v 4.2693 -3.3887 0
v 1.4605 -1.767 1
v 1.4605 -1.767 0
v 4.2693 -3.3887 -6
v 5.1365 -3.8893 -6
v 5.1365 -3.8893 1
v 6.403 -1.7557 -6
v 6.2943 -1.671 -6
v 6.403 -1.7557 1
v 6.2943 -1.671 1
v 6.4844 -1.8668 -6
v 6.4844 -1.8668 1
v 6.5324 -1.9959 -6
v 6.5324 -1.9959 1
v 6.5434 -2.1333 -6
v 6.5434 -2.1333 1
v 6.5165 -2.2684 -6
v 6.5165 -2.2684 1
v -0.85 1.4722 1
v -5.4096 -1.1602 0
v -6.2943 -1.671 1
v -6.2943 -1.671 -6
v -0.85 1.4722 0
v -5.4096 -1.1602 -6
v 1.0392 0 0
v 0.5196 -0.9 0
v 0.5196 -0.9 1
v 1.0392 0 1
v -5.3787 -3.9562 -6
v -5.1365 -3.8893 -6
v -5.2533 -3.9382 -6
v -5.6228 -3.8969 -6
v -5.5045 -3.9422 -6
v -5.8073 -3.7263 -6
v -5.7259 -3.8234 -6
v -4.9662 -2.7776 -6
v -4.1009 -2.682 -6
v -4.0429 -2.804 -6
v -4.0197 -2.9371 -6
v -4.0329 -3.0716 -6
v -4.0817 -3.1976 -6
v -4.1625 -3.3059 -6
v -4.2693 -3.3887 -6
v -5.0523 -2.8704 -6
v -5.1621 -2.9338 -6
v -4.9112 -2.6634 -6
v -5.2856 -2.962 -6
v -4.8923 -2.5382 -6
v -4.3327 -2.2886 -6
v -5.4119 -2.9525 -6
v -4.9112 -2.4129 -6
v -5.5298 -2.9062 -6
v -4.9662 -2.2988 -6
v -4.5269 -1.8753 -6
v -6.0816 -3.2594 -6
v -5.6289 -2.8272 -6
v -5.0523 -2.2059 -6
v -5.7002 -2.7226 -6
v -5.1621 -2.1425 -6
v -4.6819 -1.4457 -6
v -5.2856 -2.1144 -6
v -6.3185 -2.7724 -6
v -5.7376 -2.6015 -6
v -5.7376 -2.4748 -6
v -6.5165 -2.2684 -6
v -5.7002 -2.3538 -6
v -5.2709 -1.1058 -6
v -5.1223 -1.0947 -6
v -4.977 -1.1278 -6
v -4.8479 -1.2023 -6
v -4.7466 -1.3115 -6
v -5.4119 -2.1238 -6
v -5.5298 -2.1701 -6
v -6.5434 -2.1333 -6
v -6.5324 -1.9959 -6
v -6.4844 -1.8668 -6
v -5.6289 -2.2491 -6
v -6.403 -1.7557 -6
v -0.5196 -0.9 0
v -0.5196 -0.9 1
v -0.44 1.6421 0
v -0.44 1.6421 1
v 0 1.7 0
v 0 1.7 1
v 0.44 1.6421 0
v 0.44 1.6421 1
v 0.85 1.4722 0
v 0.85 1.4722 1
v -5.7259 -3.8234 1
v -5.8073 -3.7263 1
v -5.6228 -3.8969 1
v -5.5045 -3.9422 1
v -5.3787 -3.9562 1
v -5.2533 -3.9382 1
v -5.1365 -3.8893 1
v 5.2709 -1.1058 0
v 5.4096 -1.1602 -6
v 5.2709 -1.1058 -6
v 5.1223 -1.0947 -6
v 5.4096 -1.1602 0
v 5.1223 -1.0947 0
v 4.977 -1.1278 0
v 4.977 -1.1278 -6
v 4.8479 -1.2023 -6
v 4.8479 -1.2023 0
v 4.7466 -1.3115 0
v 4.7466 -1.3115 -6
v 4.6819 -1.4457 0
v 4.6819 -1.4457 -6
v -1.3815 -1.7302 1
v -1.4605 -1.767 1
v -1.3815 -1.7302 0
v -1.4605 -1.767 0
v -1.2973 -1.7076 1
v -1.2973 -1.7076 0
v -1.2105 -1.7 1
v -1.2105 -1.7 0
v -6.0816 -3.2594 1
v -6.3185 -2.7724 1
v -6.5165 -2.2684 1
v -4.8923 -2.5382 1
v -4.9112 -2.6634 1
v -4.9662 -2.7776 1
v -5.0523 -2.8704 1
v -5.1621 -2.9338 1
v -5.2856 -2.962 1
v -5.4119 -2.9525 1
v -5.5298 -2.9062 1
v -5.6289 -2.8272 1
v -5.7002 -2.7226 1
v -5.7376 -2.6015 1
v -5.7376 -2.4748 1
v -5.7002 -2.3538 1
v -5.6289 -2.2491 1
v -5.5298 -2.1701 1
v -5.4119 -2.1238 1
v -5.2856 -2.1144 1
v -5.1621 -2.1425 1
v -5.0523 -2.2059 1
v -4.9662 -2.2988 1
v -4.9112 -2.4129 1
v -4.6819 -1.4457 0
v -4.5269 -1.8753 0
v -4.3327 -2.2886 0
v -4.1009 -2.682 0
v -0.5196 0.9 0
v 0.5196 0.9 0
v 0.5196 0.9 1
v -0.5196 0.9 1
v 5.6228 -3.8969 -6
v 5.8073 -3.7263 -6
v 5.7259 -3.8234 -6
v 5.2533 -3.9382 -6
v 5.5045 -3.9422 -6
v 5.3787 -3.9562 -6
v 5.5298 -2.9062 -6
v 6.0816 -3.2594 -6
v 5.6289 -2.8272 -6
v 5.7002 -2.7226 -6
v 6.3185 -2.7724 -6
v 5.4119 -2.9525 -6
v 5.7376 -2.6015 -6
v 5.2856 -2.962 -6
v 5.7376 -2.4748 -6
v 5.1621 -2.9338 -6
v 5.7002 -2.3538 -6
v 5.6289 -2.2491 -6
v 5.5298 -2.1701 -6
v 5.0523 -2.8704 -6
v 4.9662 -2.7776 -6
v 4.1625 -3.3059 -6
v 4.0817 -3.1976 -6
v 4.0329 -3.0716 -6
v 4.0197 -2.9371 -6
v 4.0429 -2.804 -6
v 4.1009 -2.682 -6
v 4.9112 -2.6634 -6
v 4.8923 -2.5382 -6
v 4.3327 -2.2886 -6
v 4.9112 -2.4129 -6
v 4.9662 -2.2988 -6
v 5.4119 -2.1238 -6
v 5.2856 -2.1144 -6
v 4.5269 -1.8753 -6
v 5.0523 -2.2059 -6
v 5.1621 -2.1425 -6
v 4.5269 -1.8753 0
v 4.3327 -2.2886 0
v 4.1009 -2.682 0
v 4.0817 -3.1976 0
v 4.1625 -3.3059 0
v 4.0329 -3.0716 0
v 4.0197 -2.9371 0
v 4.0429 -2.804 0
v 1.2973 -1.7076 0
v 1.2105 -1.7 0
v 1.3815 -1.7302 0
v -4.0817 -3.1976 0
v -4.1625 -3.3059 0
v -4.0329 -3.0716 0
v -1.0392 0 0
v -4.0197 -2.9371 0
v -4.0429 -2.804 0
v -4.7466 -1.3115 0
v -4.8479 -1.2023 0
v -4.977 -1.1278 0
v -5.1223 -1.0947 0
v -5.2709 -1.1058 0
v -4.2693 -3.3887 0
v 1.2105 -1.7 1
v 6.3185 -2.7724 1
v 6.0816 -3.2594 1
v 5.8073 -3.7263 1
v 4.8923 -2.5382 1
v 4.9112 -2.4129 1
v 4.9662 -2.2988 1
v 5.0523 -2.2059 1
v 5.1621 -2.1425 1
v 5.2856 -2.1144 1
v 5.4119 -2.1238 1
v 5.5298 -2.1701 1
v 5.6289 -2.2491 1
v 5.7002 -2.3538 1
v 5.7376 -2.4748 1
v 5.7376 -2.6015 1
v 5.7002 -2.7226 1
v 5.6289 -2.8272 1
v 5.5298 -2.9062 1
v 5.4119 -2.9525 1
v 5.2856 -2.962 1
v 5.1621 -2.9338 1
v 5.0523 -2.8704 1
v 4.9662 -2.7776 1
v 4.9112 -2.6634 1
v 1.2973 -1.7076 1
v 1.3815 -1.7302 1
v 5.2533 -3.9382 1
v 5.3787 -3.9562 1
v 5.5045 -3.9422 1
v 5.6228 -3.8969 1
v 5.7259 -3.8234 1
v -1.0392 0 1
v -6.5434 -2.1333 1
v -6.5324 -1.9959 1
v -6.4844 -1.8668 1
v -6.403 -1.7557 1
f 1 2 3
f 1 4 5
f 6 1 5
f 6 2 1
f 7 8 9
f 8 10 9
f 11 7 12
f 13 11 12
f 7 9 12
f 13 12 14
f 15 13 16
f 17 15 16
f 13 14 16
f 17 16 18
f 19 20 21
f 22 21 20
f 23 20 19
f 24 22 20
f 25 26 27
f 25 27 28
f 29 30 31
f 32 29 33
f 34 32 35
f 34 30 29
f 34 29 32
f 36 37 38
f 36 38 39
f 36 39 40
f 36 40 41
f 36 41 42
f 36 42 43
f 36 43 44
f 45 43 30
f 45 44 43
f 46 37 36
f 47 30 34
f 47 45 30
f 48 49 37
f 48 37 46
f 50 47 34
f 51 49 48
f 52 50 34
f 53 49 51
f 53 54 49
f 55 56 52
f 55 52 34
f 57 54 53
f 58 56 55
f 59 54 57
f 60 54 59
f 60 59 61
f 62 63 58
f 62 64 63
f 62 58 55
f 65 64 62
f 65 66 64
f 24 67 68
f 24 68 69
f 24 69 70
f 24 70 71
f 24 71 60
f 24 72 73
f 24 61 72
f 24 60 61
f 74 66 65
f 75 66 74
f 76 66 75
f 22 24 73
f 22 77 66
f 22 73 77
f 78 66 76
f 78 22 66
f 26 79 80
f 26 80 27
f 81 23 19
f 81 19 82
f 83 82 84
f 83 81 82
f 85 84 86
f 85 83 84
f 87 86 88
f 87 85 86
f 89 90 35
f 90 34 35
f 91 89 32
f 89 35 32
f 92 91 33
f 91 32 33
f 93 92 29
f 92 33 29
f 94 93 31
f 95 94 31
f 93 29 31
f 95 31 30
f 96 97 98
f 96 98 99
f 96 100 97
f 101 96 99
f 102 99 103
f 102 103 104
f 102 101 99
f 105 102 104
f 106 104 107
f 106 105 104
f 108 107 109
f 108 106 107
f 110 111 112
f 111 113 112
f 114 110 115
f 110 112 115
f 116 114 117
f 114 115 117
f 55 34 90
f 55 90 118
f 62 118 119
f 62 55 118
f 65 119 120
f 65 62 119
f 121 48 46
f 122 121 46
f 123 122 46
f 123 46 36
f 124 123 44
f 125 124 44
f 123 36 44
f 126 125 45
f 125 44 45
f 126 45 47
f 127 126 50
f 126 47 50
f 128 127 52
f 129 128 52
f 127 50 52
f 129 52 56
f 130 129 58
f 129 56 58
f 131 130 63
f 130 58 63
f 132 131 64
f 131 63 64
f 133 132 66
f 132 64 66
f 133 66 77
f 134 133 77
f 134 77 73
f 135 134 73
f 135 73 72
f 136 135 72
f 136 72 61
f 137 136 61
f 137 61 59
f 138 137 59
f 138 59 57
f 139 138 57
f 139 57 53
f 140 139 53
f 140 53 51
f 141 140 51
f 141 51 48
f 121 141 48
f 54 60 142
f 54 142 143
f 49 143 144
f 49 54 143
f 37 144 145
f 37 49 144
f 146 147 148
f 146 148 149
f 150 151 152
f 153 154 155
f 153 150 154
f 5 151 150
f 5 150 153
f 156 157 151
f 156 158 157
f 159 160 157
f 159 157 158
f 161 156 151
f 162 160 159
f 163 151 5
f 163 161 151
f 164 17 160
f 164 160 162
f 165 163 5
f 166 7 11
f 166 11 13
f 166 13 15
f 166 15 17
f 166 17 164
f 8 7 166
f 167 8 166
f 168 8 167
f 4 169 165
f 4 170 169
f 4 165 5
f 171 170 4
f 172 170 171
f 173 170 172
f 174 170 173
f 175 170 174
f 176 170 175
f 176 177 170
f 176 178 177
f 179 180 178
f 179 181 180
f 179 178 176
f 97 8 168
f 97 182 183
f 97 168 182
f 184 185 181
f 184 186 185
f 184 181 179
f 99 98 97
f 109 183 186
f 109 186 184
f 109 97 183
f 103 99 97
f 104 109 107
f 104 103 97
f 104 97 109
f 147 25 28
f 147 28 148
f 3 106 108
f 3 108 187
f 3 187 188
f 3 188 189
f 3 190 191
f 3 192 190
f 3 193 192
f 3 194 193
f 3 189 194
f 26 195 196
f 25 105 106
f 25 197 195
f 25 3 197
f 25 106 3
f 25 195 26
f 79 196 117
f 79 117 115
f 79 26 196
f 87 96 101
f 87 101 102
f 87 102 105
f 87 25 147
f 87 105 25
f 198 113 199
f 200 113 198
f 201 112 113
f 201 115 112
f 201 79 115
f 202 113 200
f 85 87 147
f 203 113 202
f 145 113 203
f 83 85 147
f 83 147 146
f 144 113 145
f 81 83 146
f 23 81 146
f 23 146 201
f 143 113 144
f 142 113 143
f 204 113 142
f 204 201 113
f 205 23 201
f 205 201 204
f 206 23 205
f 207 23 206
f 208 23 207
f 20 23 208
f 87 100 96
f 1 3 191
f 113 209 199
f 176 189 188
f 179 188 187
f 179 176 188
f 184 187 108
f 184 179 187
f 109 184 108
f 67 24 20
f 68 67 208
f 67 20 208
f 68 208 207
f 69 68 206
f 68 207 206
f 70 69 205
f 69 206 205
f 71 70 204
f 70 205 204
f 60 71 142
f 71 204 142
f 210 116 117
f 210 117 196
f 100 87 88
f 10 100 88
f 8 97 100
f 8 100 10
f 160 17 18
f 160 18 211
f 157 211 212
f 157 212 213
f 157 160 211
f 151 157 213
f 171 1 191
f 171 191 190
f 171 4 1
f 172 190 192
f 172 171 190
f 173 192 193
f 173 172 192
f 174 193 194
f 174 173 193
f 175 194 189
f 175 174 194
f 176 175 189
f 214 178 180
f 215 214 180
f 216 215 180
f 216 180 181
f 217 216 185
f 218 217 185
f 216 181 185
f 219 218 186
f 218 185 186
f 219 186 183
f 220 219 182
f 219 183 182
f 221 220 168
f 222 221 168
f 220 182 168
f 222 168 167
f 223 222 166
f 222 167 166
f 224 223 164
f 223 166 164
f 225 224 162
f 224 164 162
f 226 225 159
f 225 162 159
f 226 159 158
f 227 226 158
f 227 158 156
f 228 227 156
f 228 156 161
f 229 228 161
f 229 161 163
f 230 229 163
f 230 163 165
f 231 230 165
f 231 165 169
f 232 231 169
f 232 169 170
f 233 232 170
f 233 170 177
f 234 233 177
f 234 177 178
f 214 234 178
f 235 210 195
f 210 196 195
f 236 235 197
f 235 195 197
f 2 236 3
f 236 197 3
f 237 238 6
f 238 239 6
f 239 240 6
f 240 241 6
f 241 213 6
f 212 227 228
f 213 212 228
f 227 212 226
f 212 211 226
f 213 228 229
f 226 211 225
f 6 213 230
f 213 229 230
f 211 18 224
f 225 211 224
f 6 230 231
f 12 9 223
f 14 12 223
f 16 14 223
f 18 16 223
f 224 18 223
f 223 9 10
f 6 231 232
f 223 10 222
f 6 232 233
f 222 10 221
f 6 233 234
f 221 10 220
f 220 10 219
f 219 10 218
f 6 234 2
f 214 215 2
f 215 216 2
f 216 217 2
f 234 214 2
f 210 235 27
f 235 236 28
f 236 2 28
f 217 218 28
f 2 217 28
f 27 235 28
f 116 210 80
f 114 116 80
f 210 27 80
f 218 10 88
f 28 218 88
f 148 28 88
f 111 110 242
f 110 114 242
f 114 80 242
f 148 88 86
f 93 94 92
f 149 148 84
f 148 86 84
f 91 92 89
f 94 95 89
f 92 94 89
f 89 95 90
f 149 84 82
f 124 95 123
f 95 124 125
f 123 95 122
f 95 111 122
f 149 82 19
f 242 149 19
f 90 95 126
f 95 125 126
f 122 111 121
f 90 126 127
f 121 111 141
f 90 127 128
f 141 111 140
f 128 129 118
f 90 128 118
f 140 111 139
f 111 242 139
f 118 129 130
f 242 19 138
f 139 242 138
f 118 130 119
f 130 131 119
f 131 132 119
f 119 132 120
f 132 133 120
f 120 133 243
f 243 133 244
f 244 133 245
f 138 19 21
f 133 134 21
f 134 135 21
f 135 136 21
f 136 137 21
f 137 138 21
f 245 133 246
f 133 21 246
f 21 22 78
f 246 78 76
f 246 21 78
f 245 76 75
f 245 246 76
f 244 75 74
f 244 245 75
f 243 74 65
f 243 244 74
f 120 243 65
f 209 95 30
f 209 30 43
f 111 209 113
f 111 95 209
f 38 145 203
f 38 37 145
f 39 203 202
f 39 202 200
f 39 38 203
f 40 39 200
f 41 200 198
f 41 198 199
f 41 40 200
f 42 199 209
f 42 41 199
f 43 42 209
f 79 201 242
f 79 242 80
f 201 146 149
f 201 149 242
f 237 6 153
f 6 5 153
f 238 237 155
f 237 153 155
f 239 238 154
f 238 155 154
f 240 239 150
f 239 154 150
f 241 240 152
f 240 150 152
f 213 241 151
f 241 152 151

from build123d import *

# Parameters (mm, degrees)
PLATE_DEPTH  = 1
PILLAR_START = -7
PILLAR_DEPTH = 7
CUT_DEPTH    = 12.862454801607791
HOLESKE_R    = 0.4249999999999999
HOLE_DEPTH   = 11.491832758845009
FILLET_2_R   = 0.5


with BuildPart() as part:
    # PlateSke → Plate (new body)
    with BuildSketch(Plane.XY):
        with BuildLine():
            Line((-4.829949748426477, -0.8255818721816728), (-0.8500000000000022, 1.472243186433545))
            ThreePointArc((-0.8500000000000022, 1.472243186433545), (1e-16, 1.7000000000000004), (0.8500000000000022, 1.472243186433545))
            Line((0.8500000000000022, 1.472243186433545), (4.829949748426477, -0.8255818721816728))
            ThreePointArc((4.829949748426477, -0.8255818721816728), (3e-16, -4.899999999999999), (-4.829949748426477, -0.8255818721816728))
        make_face()
        Polygon((1.0392304845413274, 0), (0.5196152422706616, 0.9000000000000019), (-0.5196152422706678, 0.8999999999999982), (-1.0392304845413274, -7.26e-15), (-0.5196152422706553, -0.9000000000000056), (0.5196152422706742, -0.8999999999999948), align=None, mode=Mode.SUBTRACT)
    extrude(amount=PLATE_DEPTH)

    # PillarSke → Pillar (add)
    with BuildSketch(Plane.XY.offset(1).offset(PILLAR_START)):
        with BuildLine():
            Line((-6.641372894228101, -1.87140751302655), (-4.829949748426477, -0.8255818721816716))
            ThreePointArc((-4.829949748426477, -0.8255818721816716), (-1.88e-15, -4.899999999999999), (4.829949748426477, -0.8255818721816728))
            Line((4.829949748426477, -0.8255818721816728), (6.641372894228101, -1.8714075130265588))
            ThreePointArc((6.641372894228101, -1.8714075130265588), (-4.17e-15, -6.8999999999999995), (-6.641372894228101, -1.87140751302655))
        make_face()
    extrude(amount=PILLAR_DEPTH)

    # CutSke → Cut (cut, through all)
    with BuildSketch(Plane.XY.offset(1)):
        with BuildLine():
            Line((-1.3444863728671024, -1.7000000000000057), (1.3444863728670877, -1.700000000000006))
            Line((1.3444863728670877, -1.700000000000006), (5.53527589923164, -4.119553461163642))
            ThreePointArc((5.53527589923164, -4.119553461163642), (-2.64e-15, -6.899999999999998), (-5.5352758992316415, -4.119553461163638))
            Line((-5.5352758992316415, -4.119553461163638), (-1.3444863728671024, -1.7000000000000057))
        make_face()
    extrude(amount=-CUT_DEPTH, mode=Mode.SUBTRACT)

    # HoleSke → Hole (cut, through all)
    with BuildSketch(Plane(origin=(0, 0, -6), x_dir=(-1, 0, 0), z_dir=(0, 0, -1))):
        with Locations((-5.317327275986198, -2.5381645669665653)):
            Circle(HOLESKE_R)
        with Locations(Location((5.317327275986198, -2.5381645669665653, 0), (0, 0, 180))):
            Circle(HOLESKE_R)
    extrude(amount=-HOLE_DEPTH, mode=Mode.SUBTRACT)

    # Fillet 2
    fillet_2_edges = [part.edges().sort_by_distance(p)[0] for p in [
        (-4.829949748426477, -0.8255818721816717, -3),
        (6.641372894228101, -1.8714075130265588, -2.5),
        (-6.641372894228101, -1.8714075130265502, -2.5),
        (4.829949748426477, -0.8255818721816734, -3),
        (-1.3444863728671024, -1.7000000000000057, 0.5),
        (-5.535275899231642, -4.119553461163638, -2.5),
        (1.3444863728670877, -1.700000000000006, 0.5),
        (-3.7865857210858582, -3.1099467160819145, -3),
        (3.7865857210858542, -3.1099467160819194, -3),
        (5.535275899231641, -4.119553461163642, -2.5),
    ]]
    fillet(fillet_2_edges, radius=FILLET_2_R)


solid = part.part
